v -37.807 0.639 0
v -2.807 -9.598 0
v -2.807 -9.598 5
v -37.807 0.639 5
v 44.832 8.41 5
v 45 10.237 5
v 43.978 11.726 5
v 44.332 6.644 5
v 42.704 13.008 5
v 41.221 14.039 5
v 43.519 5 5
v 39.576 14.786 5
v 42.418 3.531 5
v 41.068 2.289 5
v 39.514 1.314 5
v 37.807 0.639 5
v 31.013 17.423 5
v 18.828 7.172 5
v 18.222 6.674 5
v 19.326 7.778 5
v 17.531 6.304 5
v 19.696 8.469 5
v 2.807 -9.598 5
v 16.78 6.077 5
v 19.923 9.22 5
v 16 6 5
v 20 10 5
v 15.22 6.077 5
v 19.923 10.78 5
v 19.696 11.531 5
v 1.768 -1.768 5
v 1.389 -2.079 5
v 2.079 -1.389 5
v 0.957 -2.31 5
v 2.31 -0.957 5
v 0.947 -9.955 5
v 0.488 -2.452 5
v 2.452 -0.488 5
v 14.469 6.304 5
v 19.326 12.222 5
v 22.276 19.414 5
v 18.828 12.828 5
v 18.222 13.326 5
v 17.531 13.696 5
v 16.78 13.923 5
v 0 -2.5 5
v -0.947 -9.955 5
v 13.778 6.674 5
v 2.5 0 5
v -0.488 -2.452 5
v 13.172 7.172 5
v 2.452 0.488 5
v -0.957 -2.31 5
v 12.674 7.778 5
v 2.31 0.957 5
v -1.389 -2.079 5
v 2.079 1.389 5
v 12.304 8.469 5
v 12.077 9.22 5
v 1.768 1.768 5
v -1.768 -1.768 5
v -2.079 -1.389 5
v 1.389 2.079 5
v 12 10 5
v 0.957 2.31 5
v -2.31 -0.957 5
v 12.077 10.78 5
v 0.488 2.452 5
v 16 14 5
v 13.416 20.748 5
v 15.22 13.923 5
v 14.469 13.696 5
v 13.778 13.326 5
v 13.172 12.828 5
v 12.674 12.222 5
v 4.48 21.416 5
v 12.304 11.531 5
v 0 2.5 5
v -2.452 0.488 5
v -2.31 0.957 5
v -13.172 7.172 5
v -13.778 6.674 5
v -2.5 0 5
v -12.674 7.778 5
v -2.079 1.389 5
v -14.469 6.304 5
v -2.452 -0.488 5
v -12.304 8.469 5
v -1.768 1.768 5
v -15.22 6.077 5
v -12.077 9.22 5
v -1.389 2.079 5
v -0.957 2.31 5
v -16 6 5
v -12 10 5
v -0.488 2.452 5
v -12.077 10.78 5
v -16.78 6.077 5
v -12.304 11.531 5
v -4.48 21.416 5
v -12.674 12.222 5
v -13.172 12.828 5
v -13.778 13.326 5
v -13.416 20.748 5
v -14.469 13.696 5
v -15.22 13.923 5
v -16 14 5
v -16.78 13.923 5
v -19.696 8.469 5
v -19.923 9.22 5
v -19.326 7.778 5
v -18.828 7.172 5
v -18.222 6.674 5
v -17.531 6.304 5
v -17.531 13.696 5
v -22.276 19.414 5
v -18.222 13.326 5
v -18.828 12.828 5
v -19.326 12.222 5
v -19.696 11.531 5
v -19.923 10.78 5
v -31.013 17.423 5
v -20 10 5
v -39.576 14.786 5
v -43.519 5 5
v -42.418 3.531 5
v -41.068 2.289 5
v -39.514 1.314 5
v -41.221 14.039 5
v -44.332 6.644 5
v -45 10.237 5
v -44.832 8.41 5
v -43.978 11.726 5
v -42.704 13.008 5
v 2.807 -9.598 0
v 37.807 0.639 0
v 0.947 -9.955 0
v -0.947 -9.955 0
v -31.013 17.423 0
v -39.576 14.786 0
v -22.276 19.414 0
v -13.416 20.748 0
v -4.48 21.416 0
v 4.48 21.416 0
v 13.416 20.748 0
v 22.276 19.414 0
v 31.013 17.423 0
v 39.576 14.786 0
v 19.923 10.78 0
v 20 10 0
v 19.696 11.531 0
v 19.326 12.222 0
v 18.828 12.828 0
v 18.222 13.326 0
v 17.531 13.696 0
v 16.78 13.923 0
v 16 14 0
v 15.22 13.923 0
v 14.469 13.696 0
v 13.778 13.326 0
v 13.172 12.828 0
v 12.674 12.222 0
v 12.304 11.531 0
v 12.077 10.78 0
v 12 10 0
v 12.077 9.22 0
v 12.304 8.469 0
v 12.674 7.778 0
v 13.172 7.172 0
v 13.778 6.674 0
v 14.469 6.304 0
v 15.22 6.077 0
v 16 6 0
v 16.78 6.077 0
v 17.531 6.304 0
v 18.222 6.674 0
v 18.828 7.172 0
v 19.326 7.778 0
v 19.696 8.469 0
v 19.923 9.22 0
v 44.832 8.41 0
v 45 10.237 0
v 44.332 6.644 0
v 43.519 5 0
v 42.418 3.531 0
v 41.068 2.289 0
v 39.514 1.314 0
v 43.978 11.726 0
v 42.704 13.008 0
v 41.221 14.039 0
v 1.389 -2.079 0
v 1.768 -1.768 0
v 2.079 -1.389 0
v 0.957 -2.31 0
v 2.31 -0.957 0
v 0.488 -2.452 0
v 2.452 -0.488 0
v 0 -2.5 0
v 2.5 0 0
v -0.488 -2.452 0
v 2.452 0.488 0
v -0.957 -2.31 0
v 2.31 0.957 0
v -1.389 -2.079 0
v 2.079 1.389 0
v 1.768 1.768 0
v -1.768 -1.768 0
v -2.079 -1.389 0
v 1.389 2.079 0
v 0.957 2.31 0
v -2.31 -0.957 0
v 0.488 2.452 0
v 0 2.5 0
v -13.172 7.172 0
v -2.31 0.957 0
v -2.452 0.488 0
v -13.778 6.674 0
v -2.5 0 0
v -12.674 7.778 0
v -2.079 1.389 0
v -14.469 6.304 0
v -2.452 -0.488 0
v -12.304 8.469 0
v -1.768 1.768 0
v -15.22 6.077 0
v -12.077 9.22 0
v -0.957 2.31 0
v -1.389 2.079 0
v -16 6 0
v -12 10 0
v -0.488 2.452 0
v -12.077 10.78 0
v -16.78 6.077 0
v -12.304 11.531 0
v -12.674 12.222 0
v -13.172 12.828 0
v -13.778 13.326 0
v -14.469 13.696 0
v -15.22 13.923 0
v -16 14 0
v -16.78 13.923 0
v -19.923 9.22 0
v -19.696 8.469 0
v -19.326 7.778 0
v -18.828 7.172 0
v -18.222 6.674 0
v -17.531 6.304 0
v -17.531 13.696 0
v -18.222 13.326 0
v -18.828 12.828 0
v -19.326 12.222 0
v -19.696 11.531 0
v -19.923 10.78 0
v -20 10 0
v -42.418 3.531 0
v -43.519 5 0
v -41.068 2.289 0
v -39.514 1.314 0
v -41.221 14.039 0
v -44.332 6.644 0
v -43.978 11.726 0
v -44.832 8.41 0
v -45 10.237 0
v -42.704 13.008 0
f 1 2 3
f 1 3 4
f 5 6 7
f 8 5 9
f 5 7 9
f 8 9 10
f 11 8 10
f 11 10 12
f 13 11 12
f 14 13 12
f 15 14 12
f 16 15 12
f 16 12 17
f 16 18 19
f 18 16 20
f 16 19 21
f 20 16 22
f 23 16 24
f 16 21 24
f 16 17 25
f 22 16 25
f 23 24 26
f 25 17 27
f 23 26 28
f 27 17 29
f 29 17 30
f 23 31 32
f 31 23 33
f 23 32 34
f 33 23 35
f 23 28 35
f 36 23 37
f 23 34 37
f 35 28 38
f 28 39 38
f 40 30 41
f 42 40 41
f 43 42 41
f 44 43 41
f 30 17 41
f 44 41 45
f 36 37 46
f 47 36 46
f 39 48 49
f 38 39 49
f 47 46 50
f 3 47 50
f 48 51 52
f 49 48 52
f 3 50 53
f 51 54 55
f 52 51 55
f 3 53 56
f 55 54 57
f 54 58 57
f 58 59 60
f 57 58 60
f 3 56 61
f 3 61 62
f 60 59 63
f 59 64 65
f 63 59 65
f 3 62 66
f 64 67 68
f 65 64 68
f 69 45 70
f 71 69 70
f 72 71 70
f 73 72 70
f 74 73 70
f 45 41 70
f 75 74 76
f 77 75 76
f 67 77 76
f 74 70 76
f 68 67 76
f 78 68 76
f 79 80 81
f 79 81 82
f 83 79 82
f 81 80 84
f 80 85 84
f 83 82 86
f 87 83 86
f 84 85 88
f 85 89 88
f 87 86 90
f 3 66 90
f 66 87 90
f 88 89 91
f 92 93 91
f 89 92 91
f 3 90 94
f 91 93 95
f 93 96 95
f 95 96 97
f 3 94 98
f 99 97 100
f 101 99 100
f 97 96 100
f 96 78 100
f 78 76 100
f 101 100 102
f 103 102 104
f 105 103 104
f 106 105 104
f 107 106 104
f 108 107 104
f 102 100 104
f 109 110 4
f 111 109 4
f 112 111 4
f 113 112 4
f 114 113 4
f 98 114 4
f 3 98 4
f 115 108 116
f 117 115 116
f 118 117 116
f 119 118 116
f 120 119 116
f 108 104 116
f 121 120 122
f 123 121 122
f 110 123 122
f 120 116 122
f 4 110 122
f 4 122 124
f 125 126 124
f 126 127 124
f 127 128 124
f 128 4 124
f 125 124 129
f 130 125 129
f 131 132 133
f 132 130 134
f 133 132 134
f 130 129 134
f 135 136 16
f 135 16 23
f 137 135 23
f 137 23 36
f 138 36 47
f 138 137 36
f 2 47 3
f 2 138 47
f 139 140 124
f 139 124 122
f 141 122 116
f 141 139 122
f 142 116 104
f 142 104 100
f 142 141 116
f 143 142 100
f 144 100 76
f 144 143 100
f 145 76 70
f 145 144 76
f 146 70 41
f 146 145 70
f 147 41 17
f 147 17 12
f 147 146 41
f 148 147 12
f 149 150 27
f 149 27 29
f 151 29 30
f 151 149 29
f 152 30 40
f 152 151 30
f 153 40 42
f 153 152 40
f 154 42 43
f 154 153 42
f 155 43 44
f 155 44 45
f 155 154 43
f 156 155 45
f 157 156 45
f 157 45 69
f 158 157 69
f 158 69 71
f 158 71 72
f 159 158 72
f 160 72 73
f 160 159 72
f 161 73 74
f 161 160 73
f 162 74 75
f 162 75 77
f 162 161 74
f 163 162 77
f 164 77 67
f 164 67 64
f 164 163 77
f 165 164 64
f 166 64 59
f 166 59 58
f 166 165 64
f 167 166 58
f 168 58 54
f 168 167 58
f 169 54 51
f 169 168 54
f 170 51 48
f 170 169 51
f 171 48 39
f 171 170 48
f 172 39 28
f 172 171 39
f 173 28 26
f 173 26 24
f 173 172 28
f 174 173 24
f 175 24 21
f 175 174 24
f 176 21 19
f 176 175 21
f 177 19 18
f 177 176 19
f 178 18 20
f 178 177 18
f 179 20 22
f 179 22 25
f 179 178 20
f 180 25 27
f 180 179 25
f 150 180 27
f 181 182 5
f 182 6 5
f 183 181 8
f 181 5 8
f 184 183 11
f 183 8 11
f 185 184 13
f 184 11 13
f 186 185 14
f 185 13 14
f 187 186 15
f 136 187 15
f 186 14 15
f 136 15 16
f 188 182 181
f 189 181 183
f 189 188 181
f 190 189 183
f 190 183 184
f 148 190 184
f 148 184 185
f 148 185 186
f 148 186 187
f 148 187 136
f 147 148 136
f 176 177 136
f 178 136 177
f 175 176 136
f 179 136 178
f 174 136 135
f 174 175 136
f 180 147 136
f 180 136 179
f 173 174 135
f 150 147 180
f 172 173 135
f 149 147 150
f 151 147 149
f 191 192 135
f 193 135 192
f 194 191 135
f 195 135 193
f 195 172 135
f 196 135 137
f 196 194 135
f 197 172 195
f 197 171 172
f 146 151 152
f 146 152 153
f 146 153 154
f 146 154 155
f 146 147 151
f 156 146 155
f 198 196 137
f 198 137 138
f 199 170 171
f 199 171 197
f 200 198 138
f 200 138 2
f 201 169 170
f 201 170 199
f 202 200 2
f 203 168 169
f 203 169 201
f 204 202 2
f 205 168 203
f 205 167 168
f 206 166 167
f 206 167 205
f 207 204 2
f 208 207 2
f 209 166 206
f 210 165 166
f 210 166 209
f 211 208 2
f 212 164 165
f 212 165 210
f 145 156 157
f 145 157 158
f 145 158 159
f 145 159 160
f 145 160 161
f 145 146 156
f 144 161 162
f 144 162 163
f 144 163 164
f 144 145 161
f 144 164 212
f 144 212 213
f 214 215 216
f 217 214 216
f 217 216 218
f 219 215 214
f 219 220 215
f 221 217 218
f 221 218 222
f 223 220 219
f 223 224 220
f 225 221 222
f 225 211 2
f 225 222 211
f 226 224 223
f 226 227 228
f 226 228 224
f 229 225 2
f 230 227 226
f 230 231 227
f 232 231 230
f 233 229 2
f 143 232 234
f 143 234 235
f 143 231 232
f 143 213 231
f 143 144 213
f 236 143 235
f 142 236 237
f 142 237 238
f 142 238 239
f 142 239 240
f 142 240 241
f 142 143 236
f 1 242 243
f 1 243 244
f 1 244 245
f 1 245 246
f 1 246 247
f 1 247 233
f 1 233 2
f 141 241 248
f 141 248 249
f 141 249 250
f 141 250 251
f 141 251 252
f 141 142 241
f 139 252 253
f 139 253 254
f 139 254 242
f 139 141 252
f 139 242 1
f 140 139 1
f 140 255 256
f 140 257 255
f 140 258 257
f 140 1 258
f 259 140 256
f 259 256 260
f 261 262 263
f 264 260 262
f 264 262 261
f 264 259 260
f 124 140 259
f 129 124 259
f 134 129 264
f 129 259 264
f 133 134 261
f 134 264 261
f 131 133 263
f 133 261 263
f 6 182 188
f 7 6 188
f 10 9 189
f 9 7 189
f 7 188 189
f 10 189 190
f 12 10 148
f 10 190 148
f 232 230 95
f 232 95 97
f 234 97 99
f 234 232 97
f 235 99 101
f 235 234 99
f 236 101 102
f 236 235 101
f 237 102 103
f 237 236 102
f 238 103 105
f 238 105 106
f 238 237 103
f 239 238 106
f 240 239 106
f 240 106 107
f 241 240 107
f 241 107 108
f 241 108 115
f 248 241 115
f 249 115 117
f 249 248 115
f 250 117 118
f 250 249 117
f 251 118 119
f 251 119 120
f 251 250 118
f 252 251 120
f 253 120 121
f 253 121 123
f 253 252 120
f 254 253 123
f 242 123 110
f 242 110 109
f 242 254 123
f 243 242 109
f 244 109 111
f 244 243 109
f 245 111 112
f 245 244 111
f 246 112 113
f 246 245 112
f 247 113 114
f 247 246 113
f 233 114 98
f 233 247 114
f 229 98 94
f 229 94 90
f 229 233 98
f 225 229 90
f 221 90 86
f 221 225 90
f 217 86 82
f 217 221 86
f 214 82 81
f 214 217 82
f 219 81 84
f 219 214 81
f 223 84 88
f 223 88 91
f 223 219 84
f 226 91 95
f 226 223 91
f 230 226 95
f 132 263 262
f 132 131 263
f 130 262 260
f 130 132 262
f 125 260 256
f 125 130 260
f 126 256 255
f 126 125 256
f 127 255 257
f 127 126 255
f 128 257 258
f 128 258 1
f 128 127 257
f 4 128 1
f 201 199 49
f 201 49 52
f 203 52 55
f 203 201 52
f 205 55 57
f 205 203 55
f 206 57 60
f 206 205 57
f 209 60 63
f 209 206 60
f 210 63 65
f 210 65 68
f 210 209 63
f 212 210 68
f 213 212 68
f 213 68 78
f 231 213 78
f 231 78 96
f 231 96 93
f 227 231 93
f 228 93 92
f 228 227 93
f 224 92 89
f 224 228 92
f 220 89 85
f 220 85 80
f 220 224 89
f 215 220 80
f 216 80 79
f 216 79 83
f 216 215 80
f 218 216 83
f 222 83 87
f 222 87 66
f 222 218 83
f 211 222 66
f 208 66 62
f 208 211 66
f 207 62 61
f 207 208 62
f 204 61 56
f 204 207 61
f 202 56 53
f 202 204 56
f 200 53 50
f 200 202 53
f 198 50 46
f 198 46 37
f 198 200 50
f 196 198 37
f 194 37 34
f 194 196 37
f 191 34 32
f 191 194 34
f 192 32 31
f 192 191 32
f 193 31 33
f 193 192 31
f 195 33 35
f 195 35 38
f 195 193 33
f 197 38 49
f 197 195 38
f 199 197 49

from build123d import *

# Parameters (mm, degrees)
SKETCH1_R           = 2.5
SKETCH1_R_2         = 4
BOSS_EXTRUDE1_DEPTH = 5
FILLET1_R           = 10
FILLET2_R           = 10


with BuildPart() as part:
    # Sketch1 → Boss-Extrude1 (new body)
    with BuildSketch(Plane.XY):
        with BuildLine():
            Line((45, 12.742977306), (45, 2.742977306))
            Line((45, 2.742977306), (2.807261435, -9.597879101))
            ThreePointArc((2.807261435, -9.597879101), (0, -10), (-2.807261435, -9.597879101))
            Line((-2.807261435, -9.597879101), (-45, 2.742977306))
            Line((-45, 2.742977306), (-45, 12.742977306))
            ThreePointArc((-45, 12.742977306), (0, 21.5), (45, 12.742977306))
        make_face()
        Circle(SKETCH1_R, mode=Mode.SUBTRACT)
        with Locations((16, 10)):
            Circle(SKETCH1_R_2, mode=Mode.SUBTRACT)
        with Locations((-16, 10)):
            Circle(SKETCH1_R_2, mode=Mode.SUBTRACT)
    extrude(amount=BOSS_EXTRUDE1_DEPTH)

    # Fillet1
    fillet1_edges = [part.edges().sort_by_distance(p)[0] for p in [
        (-45, 2.742977306, 2.5),
        (45, 2.742977306, 2.5),
    ]]
    fillet(fillet1_edges, radius=FILLET1_R)

    # Fillet2
    # the kernel refuses this fillet: 10 mm, written as the material it takes off along each edge
    with BuildSketch(Plane(origin=(45, 12.742977306, -14.490141462), x_dir=(0, -1, 0), z_dir=(0, 0, 1))) as fillet2_piece_1:
        with BuildLine():
            CenterArc((7.397382661, -8.722011181), FILLET2_R, 119.284560105, 41.458809305)
            Line((-2.043125943, -5.424012197), (-2.231936115, -5.358052218))
            ThreePointArc((-2.231936115, -5.358052218), (-1.241477696, -2.629168254), (-0.185404962, 0.075))
            Line((-0.185404962, 0.075), (0, 0.2))
            ThreePointArc((0, 0.2), (1.252954174, 0.2), (2.408078861, 0.174440224))
            Line((2.408078861, 0.174440224), (2.505908347, 0))
        make_face()
    extrude(amount=33.980282925, mode=Mode.SUBTRACT)
    with BuildSketch(Plane(origin=(-45, 12.742977306, -14.490141462), x_dir=(0.9358107737298137, 0.3525027599483545, 0), z_dir=(0, 0, 1))) as fillet2_piece_2:
        with BuildLine():
            CenterArc((5.554554227, -9.997083405), FILLET2_R, 88.616158877, 41.458809305)
            Line((-0.883339609, -2.34505603), (-1.012097485, -2.192015482))
            ThreePointArc((-1.012097485, -2.192015482), (-0.628831959, -1.102027463), (-0.187162155, 0.070500552))
            Line((-0.187162155, 0.070500552), (-0.004830047, 0.199941668))
            ThreePointArc((-0.004830047, 0.199941668), (2.898028292, 0.234999137), (5.800886632, 0.199941668))
            Line((5.800886632, 0.199941668), (5.796056585, 0))
        make_face()
    extrude(amount=33.980282925, mode=Mode.SUBTRACT)


solid = part.part
